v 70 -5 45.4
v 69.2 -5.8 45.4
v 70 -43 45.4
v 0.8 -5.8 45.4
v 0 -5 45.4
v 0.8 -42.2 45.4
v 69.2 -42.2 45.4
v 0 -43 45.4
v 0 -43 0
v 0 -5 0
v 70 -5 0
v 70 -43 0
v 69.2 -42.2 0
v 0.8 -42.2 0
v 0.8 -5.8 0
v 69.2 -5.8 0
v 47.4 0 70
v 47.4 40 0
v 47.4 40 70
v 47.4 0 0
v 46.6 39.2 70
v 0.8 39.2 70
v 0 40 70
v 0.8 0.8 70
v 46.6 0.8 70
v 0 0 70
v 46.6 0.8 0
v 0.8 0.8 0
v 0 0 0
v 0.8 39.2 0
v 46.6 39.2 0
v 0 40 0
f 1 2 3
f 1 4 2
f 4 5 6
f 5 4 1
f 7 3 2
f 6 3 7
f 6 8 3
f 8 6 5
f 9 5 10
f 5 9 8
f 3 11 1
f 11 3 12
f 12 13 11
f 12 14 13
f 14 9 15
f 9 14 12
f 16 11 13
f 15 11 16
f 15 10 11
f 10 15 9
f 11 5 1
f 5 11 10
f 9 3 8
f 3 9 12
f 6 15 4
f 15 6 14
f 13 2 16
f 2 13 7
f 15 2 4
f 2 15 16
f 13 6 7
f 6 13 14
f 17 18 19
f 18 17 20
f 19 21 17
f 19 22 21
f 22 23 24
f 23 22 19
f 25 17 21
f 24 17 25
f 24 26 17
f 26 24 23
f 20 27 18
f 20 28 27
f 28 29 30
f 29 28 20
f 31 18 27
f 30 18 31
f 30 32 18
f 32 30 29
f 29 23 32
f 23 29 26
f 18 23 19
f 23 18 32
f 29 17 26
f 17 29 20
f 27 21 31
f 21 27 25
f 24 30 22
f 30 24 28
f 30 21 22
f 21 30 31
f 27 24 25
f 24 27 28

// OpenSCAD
h=68 ; // height of cube
w=45; // width of cube
d=36; // depth of cube 

tw=0.8; // wall thickness
m=0.2; // margin


    color("green") // inner cube
    translate([h+2*m+2*tw,-d-2*m-2*tw-5,0])
    rotate([0,-90,0])
    difference()
    {
        cube([w+2*m,d+2*m+2*tw,h+2*m+2*tw]);
        translate([-m,tw,tw])
        cube([w+4*m,d+2*m,h+2*m]);
    };

    color("red") // outer cube
    difference()
    {
        cube([w+4*m+2*tw,d+4*m+4*tw,h+2*m+2*tw]);
        translate([tw,tw,-m])
        cube([w+4*m,d+4*m+2*tw,h+4*m+2*tw]);
    };
    
